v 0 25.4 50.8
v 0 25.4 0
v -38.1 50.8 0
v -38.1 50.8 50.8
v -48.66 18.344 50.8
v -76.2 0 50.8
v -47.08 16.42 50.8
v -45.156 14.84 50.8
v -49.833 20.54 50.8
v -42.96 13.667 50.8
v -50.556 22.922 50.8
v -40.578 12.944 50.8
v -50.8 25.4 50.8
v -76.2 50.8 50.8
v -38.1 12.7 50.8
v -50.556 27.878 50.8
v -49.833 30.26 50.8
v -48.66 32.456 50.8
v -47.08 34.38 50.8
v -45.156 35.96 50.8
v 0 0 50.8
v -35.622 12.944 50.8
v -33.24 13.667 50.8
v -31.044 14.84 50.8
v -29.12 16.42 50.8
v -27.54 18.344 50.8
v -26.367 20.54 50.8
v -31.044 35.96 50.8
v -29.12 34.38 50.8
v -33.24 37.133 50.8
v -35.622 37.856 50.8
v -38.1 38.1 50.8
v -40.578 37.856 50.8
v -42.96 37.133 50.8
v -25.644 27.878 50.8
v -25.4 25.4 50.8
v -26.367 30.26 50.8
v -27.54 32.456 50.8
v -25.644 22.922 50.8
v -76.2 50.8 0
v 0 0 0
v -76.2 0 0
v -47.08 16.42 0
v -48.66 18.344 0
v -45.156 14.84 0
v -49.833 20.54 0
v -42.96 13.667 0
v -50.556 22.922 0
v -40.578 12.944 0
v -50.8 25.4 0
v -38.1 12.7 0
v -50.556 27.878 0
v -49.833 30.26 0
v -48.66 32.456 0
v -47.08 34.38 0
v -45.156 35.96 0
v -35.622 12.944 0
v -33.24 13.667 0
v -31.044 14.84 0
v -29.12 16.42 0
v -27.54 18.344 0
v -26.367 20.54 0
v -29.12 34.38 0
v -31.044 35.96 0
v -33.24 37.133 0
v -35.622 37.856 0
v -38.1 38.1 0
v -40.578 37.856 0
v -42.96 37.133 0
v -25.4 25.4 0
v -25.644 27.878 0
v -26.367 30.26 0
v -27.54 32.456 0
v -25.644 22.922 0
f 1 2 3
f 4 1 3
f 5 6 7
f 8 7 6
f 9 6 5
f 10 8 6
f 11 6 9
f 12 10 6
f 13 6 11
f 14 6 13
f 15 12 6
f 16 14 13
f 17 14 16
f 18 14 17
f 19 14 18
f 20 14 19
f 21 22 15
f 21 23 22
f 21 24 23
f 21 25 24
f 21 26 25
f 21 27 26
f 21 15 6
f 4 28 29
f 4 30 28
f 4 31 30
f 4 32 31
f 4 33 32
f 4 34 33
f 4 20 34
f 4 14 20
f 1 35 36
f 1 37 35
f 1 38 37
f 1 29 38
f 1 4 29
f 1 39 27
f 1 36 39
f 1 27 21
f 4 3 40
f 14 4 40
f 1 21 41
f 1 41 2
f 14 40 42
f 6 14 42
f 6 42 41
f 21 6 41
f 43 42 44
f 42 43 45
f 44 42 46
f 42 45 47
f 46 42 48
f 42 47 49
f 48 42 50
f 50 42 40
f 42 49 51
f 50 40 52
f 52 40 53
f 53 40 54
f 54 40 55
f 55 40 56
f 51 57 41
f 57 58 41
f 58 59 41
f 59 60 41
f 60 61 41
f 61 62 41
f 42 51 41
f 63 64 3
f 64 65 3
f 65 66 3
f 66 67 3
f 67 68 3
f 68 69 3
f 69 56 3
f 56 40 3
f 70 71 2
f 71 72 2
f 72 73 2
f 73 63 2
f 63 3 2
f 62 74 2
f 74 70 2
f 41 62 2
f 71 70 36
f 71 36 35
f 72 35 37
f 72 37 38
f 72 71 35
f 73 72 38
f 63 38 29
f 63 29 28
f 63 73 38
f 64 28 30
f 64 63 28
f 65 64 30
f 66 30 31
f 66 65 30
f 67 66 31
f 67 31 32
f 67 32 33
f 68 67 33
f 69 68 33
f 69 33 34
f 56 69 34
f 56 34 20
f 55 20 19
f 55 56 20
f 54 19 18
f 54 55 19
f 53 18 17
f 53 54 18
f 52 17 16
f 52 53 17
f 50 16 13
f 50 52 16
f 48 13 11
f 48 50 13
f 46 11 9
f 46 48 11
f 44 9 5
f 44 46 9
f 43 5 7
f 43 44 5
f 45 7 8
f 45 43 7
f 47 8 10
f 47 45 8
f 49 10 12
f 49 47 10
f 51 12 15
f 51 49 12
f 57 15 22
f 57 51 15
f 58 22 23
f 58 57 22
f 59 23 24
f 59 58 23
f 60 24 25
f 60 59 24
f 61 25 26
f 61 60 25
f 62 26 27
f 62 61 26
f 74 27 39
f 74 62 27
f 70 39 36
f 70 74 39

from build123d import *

# Parameters (mm, degrees)
F0_R     = 12.7
F1_DEPTH = 50.8


with BuildPart() as f1:
    # F0 (on Top) → F1 (new body)
    with BuildSketch(Plane.XY):
        Polygon((-76.2, 0), (0, 0), (0, 25.4), (-38.1, 50.8), (-76.2, 50.8), align=None)
        with Locations((-38.1, 25.4)):
            Circle(F0_R, mode=Mode.SUBTRACT)
    extrude(amount=F1_DEPTH)


solid = f1.part
